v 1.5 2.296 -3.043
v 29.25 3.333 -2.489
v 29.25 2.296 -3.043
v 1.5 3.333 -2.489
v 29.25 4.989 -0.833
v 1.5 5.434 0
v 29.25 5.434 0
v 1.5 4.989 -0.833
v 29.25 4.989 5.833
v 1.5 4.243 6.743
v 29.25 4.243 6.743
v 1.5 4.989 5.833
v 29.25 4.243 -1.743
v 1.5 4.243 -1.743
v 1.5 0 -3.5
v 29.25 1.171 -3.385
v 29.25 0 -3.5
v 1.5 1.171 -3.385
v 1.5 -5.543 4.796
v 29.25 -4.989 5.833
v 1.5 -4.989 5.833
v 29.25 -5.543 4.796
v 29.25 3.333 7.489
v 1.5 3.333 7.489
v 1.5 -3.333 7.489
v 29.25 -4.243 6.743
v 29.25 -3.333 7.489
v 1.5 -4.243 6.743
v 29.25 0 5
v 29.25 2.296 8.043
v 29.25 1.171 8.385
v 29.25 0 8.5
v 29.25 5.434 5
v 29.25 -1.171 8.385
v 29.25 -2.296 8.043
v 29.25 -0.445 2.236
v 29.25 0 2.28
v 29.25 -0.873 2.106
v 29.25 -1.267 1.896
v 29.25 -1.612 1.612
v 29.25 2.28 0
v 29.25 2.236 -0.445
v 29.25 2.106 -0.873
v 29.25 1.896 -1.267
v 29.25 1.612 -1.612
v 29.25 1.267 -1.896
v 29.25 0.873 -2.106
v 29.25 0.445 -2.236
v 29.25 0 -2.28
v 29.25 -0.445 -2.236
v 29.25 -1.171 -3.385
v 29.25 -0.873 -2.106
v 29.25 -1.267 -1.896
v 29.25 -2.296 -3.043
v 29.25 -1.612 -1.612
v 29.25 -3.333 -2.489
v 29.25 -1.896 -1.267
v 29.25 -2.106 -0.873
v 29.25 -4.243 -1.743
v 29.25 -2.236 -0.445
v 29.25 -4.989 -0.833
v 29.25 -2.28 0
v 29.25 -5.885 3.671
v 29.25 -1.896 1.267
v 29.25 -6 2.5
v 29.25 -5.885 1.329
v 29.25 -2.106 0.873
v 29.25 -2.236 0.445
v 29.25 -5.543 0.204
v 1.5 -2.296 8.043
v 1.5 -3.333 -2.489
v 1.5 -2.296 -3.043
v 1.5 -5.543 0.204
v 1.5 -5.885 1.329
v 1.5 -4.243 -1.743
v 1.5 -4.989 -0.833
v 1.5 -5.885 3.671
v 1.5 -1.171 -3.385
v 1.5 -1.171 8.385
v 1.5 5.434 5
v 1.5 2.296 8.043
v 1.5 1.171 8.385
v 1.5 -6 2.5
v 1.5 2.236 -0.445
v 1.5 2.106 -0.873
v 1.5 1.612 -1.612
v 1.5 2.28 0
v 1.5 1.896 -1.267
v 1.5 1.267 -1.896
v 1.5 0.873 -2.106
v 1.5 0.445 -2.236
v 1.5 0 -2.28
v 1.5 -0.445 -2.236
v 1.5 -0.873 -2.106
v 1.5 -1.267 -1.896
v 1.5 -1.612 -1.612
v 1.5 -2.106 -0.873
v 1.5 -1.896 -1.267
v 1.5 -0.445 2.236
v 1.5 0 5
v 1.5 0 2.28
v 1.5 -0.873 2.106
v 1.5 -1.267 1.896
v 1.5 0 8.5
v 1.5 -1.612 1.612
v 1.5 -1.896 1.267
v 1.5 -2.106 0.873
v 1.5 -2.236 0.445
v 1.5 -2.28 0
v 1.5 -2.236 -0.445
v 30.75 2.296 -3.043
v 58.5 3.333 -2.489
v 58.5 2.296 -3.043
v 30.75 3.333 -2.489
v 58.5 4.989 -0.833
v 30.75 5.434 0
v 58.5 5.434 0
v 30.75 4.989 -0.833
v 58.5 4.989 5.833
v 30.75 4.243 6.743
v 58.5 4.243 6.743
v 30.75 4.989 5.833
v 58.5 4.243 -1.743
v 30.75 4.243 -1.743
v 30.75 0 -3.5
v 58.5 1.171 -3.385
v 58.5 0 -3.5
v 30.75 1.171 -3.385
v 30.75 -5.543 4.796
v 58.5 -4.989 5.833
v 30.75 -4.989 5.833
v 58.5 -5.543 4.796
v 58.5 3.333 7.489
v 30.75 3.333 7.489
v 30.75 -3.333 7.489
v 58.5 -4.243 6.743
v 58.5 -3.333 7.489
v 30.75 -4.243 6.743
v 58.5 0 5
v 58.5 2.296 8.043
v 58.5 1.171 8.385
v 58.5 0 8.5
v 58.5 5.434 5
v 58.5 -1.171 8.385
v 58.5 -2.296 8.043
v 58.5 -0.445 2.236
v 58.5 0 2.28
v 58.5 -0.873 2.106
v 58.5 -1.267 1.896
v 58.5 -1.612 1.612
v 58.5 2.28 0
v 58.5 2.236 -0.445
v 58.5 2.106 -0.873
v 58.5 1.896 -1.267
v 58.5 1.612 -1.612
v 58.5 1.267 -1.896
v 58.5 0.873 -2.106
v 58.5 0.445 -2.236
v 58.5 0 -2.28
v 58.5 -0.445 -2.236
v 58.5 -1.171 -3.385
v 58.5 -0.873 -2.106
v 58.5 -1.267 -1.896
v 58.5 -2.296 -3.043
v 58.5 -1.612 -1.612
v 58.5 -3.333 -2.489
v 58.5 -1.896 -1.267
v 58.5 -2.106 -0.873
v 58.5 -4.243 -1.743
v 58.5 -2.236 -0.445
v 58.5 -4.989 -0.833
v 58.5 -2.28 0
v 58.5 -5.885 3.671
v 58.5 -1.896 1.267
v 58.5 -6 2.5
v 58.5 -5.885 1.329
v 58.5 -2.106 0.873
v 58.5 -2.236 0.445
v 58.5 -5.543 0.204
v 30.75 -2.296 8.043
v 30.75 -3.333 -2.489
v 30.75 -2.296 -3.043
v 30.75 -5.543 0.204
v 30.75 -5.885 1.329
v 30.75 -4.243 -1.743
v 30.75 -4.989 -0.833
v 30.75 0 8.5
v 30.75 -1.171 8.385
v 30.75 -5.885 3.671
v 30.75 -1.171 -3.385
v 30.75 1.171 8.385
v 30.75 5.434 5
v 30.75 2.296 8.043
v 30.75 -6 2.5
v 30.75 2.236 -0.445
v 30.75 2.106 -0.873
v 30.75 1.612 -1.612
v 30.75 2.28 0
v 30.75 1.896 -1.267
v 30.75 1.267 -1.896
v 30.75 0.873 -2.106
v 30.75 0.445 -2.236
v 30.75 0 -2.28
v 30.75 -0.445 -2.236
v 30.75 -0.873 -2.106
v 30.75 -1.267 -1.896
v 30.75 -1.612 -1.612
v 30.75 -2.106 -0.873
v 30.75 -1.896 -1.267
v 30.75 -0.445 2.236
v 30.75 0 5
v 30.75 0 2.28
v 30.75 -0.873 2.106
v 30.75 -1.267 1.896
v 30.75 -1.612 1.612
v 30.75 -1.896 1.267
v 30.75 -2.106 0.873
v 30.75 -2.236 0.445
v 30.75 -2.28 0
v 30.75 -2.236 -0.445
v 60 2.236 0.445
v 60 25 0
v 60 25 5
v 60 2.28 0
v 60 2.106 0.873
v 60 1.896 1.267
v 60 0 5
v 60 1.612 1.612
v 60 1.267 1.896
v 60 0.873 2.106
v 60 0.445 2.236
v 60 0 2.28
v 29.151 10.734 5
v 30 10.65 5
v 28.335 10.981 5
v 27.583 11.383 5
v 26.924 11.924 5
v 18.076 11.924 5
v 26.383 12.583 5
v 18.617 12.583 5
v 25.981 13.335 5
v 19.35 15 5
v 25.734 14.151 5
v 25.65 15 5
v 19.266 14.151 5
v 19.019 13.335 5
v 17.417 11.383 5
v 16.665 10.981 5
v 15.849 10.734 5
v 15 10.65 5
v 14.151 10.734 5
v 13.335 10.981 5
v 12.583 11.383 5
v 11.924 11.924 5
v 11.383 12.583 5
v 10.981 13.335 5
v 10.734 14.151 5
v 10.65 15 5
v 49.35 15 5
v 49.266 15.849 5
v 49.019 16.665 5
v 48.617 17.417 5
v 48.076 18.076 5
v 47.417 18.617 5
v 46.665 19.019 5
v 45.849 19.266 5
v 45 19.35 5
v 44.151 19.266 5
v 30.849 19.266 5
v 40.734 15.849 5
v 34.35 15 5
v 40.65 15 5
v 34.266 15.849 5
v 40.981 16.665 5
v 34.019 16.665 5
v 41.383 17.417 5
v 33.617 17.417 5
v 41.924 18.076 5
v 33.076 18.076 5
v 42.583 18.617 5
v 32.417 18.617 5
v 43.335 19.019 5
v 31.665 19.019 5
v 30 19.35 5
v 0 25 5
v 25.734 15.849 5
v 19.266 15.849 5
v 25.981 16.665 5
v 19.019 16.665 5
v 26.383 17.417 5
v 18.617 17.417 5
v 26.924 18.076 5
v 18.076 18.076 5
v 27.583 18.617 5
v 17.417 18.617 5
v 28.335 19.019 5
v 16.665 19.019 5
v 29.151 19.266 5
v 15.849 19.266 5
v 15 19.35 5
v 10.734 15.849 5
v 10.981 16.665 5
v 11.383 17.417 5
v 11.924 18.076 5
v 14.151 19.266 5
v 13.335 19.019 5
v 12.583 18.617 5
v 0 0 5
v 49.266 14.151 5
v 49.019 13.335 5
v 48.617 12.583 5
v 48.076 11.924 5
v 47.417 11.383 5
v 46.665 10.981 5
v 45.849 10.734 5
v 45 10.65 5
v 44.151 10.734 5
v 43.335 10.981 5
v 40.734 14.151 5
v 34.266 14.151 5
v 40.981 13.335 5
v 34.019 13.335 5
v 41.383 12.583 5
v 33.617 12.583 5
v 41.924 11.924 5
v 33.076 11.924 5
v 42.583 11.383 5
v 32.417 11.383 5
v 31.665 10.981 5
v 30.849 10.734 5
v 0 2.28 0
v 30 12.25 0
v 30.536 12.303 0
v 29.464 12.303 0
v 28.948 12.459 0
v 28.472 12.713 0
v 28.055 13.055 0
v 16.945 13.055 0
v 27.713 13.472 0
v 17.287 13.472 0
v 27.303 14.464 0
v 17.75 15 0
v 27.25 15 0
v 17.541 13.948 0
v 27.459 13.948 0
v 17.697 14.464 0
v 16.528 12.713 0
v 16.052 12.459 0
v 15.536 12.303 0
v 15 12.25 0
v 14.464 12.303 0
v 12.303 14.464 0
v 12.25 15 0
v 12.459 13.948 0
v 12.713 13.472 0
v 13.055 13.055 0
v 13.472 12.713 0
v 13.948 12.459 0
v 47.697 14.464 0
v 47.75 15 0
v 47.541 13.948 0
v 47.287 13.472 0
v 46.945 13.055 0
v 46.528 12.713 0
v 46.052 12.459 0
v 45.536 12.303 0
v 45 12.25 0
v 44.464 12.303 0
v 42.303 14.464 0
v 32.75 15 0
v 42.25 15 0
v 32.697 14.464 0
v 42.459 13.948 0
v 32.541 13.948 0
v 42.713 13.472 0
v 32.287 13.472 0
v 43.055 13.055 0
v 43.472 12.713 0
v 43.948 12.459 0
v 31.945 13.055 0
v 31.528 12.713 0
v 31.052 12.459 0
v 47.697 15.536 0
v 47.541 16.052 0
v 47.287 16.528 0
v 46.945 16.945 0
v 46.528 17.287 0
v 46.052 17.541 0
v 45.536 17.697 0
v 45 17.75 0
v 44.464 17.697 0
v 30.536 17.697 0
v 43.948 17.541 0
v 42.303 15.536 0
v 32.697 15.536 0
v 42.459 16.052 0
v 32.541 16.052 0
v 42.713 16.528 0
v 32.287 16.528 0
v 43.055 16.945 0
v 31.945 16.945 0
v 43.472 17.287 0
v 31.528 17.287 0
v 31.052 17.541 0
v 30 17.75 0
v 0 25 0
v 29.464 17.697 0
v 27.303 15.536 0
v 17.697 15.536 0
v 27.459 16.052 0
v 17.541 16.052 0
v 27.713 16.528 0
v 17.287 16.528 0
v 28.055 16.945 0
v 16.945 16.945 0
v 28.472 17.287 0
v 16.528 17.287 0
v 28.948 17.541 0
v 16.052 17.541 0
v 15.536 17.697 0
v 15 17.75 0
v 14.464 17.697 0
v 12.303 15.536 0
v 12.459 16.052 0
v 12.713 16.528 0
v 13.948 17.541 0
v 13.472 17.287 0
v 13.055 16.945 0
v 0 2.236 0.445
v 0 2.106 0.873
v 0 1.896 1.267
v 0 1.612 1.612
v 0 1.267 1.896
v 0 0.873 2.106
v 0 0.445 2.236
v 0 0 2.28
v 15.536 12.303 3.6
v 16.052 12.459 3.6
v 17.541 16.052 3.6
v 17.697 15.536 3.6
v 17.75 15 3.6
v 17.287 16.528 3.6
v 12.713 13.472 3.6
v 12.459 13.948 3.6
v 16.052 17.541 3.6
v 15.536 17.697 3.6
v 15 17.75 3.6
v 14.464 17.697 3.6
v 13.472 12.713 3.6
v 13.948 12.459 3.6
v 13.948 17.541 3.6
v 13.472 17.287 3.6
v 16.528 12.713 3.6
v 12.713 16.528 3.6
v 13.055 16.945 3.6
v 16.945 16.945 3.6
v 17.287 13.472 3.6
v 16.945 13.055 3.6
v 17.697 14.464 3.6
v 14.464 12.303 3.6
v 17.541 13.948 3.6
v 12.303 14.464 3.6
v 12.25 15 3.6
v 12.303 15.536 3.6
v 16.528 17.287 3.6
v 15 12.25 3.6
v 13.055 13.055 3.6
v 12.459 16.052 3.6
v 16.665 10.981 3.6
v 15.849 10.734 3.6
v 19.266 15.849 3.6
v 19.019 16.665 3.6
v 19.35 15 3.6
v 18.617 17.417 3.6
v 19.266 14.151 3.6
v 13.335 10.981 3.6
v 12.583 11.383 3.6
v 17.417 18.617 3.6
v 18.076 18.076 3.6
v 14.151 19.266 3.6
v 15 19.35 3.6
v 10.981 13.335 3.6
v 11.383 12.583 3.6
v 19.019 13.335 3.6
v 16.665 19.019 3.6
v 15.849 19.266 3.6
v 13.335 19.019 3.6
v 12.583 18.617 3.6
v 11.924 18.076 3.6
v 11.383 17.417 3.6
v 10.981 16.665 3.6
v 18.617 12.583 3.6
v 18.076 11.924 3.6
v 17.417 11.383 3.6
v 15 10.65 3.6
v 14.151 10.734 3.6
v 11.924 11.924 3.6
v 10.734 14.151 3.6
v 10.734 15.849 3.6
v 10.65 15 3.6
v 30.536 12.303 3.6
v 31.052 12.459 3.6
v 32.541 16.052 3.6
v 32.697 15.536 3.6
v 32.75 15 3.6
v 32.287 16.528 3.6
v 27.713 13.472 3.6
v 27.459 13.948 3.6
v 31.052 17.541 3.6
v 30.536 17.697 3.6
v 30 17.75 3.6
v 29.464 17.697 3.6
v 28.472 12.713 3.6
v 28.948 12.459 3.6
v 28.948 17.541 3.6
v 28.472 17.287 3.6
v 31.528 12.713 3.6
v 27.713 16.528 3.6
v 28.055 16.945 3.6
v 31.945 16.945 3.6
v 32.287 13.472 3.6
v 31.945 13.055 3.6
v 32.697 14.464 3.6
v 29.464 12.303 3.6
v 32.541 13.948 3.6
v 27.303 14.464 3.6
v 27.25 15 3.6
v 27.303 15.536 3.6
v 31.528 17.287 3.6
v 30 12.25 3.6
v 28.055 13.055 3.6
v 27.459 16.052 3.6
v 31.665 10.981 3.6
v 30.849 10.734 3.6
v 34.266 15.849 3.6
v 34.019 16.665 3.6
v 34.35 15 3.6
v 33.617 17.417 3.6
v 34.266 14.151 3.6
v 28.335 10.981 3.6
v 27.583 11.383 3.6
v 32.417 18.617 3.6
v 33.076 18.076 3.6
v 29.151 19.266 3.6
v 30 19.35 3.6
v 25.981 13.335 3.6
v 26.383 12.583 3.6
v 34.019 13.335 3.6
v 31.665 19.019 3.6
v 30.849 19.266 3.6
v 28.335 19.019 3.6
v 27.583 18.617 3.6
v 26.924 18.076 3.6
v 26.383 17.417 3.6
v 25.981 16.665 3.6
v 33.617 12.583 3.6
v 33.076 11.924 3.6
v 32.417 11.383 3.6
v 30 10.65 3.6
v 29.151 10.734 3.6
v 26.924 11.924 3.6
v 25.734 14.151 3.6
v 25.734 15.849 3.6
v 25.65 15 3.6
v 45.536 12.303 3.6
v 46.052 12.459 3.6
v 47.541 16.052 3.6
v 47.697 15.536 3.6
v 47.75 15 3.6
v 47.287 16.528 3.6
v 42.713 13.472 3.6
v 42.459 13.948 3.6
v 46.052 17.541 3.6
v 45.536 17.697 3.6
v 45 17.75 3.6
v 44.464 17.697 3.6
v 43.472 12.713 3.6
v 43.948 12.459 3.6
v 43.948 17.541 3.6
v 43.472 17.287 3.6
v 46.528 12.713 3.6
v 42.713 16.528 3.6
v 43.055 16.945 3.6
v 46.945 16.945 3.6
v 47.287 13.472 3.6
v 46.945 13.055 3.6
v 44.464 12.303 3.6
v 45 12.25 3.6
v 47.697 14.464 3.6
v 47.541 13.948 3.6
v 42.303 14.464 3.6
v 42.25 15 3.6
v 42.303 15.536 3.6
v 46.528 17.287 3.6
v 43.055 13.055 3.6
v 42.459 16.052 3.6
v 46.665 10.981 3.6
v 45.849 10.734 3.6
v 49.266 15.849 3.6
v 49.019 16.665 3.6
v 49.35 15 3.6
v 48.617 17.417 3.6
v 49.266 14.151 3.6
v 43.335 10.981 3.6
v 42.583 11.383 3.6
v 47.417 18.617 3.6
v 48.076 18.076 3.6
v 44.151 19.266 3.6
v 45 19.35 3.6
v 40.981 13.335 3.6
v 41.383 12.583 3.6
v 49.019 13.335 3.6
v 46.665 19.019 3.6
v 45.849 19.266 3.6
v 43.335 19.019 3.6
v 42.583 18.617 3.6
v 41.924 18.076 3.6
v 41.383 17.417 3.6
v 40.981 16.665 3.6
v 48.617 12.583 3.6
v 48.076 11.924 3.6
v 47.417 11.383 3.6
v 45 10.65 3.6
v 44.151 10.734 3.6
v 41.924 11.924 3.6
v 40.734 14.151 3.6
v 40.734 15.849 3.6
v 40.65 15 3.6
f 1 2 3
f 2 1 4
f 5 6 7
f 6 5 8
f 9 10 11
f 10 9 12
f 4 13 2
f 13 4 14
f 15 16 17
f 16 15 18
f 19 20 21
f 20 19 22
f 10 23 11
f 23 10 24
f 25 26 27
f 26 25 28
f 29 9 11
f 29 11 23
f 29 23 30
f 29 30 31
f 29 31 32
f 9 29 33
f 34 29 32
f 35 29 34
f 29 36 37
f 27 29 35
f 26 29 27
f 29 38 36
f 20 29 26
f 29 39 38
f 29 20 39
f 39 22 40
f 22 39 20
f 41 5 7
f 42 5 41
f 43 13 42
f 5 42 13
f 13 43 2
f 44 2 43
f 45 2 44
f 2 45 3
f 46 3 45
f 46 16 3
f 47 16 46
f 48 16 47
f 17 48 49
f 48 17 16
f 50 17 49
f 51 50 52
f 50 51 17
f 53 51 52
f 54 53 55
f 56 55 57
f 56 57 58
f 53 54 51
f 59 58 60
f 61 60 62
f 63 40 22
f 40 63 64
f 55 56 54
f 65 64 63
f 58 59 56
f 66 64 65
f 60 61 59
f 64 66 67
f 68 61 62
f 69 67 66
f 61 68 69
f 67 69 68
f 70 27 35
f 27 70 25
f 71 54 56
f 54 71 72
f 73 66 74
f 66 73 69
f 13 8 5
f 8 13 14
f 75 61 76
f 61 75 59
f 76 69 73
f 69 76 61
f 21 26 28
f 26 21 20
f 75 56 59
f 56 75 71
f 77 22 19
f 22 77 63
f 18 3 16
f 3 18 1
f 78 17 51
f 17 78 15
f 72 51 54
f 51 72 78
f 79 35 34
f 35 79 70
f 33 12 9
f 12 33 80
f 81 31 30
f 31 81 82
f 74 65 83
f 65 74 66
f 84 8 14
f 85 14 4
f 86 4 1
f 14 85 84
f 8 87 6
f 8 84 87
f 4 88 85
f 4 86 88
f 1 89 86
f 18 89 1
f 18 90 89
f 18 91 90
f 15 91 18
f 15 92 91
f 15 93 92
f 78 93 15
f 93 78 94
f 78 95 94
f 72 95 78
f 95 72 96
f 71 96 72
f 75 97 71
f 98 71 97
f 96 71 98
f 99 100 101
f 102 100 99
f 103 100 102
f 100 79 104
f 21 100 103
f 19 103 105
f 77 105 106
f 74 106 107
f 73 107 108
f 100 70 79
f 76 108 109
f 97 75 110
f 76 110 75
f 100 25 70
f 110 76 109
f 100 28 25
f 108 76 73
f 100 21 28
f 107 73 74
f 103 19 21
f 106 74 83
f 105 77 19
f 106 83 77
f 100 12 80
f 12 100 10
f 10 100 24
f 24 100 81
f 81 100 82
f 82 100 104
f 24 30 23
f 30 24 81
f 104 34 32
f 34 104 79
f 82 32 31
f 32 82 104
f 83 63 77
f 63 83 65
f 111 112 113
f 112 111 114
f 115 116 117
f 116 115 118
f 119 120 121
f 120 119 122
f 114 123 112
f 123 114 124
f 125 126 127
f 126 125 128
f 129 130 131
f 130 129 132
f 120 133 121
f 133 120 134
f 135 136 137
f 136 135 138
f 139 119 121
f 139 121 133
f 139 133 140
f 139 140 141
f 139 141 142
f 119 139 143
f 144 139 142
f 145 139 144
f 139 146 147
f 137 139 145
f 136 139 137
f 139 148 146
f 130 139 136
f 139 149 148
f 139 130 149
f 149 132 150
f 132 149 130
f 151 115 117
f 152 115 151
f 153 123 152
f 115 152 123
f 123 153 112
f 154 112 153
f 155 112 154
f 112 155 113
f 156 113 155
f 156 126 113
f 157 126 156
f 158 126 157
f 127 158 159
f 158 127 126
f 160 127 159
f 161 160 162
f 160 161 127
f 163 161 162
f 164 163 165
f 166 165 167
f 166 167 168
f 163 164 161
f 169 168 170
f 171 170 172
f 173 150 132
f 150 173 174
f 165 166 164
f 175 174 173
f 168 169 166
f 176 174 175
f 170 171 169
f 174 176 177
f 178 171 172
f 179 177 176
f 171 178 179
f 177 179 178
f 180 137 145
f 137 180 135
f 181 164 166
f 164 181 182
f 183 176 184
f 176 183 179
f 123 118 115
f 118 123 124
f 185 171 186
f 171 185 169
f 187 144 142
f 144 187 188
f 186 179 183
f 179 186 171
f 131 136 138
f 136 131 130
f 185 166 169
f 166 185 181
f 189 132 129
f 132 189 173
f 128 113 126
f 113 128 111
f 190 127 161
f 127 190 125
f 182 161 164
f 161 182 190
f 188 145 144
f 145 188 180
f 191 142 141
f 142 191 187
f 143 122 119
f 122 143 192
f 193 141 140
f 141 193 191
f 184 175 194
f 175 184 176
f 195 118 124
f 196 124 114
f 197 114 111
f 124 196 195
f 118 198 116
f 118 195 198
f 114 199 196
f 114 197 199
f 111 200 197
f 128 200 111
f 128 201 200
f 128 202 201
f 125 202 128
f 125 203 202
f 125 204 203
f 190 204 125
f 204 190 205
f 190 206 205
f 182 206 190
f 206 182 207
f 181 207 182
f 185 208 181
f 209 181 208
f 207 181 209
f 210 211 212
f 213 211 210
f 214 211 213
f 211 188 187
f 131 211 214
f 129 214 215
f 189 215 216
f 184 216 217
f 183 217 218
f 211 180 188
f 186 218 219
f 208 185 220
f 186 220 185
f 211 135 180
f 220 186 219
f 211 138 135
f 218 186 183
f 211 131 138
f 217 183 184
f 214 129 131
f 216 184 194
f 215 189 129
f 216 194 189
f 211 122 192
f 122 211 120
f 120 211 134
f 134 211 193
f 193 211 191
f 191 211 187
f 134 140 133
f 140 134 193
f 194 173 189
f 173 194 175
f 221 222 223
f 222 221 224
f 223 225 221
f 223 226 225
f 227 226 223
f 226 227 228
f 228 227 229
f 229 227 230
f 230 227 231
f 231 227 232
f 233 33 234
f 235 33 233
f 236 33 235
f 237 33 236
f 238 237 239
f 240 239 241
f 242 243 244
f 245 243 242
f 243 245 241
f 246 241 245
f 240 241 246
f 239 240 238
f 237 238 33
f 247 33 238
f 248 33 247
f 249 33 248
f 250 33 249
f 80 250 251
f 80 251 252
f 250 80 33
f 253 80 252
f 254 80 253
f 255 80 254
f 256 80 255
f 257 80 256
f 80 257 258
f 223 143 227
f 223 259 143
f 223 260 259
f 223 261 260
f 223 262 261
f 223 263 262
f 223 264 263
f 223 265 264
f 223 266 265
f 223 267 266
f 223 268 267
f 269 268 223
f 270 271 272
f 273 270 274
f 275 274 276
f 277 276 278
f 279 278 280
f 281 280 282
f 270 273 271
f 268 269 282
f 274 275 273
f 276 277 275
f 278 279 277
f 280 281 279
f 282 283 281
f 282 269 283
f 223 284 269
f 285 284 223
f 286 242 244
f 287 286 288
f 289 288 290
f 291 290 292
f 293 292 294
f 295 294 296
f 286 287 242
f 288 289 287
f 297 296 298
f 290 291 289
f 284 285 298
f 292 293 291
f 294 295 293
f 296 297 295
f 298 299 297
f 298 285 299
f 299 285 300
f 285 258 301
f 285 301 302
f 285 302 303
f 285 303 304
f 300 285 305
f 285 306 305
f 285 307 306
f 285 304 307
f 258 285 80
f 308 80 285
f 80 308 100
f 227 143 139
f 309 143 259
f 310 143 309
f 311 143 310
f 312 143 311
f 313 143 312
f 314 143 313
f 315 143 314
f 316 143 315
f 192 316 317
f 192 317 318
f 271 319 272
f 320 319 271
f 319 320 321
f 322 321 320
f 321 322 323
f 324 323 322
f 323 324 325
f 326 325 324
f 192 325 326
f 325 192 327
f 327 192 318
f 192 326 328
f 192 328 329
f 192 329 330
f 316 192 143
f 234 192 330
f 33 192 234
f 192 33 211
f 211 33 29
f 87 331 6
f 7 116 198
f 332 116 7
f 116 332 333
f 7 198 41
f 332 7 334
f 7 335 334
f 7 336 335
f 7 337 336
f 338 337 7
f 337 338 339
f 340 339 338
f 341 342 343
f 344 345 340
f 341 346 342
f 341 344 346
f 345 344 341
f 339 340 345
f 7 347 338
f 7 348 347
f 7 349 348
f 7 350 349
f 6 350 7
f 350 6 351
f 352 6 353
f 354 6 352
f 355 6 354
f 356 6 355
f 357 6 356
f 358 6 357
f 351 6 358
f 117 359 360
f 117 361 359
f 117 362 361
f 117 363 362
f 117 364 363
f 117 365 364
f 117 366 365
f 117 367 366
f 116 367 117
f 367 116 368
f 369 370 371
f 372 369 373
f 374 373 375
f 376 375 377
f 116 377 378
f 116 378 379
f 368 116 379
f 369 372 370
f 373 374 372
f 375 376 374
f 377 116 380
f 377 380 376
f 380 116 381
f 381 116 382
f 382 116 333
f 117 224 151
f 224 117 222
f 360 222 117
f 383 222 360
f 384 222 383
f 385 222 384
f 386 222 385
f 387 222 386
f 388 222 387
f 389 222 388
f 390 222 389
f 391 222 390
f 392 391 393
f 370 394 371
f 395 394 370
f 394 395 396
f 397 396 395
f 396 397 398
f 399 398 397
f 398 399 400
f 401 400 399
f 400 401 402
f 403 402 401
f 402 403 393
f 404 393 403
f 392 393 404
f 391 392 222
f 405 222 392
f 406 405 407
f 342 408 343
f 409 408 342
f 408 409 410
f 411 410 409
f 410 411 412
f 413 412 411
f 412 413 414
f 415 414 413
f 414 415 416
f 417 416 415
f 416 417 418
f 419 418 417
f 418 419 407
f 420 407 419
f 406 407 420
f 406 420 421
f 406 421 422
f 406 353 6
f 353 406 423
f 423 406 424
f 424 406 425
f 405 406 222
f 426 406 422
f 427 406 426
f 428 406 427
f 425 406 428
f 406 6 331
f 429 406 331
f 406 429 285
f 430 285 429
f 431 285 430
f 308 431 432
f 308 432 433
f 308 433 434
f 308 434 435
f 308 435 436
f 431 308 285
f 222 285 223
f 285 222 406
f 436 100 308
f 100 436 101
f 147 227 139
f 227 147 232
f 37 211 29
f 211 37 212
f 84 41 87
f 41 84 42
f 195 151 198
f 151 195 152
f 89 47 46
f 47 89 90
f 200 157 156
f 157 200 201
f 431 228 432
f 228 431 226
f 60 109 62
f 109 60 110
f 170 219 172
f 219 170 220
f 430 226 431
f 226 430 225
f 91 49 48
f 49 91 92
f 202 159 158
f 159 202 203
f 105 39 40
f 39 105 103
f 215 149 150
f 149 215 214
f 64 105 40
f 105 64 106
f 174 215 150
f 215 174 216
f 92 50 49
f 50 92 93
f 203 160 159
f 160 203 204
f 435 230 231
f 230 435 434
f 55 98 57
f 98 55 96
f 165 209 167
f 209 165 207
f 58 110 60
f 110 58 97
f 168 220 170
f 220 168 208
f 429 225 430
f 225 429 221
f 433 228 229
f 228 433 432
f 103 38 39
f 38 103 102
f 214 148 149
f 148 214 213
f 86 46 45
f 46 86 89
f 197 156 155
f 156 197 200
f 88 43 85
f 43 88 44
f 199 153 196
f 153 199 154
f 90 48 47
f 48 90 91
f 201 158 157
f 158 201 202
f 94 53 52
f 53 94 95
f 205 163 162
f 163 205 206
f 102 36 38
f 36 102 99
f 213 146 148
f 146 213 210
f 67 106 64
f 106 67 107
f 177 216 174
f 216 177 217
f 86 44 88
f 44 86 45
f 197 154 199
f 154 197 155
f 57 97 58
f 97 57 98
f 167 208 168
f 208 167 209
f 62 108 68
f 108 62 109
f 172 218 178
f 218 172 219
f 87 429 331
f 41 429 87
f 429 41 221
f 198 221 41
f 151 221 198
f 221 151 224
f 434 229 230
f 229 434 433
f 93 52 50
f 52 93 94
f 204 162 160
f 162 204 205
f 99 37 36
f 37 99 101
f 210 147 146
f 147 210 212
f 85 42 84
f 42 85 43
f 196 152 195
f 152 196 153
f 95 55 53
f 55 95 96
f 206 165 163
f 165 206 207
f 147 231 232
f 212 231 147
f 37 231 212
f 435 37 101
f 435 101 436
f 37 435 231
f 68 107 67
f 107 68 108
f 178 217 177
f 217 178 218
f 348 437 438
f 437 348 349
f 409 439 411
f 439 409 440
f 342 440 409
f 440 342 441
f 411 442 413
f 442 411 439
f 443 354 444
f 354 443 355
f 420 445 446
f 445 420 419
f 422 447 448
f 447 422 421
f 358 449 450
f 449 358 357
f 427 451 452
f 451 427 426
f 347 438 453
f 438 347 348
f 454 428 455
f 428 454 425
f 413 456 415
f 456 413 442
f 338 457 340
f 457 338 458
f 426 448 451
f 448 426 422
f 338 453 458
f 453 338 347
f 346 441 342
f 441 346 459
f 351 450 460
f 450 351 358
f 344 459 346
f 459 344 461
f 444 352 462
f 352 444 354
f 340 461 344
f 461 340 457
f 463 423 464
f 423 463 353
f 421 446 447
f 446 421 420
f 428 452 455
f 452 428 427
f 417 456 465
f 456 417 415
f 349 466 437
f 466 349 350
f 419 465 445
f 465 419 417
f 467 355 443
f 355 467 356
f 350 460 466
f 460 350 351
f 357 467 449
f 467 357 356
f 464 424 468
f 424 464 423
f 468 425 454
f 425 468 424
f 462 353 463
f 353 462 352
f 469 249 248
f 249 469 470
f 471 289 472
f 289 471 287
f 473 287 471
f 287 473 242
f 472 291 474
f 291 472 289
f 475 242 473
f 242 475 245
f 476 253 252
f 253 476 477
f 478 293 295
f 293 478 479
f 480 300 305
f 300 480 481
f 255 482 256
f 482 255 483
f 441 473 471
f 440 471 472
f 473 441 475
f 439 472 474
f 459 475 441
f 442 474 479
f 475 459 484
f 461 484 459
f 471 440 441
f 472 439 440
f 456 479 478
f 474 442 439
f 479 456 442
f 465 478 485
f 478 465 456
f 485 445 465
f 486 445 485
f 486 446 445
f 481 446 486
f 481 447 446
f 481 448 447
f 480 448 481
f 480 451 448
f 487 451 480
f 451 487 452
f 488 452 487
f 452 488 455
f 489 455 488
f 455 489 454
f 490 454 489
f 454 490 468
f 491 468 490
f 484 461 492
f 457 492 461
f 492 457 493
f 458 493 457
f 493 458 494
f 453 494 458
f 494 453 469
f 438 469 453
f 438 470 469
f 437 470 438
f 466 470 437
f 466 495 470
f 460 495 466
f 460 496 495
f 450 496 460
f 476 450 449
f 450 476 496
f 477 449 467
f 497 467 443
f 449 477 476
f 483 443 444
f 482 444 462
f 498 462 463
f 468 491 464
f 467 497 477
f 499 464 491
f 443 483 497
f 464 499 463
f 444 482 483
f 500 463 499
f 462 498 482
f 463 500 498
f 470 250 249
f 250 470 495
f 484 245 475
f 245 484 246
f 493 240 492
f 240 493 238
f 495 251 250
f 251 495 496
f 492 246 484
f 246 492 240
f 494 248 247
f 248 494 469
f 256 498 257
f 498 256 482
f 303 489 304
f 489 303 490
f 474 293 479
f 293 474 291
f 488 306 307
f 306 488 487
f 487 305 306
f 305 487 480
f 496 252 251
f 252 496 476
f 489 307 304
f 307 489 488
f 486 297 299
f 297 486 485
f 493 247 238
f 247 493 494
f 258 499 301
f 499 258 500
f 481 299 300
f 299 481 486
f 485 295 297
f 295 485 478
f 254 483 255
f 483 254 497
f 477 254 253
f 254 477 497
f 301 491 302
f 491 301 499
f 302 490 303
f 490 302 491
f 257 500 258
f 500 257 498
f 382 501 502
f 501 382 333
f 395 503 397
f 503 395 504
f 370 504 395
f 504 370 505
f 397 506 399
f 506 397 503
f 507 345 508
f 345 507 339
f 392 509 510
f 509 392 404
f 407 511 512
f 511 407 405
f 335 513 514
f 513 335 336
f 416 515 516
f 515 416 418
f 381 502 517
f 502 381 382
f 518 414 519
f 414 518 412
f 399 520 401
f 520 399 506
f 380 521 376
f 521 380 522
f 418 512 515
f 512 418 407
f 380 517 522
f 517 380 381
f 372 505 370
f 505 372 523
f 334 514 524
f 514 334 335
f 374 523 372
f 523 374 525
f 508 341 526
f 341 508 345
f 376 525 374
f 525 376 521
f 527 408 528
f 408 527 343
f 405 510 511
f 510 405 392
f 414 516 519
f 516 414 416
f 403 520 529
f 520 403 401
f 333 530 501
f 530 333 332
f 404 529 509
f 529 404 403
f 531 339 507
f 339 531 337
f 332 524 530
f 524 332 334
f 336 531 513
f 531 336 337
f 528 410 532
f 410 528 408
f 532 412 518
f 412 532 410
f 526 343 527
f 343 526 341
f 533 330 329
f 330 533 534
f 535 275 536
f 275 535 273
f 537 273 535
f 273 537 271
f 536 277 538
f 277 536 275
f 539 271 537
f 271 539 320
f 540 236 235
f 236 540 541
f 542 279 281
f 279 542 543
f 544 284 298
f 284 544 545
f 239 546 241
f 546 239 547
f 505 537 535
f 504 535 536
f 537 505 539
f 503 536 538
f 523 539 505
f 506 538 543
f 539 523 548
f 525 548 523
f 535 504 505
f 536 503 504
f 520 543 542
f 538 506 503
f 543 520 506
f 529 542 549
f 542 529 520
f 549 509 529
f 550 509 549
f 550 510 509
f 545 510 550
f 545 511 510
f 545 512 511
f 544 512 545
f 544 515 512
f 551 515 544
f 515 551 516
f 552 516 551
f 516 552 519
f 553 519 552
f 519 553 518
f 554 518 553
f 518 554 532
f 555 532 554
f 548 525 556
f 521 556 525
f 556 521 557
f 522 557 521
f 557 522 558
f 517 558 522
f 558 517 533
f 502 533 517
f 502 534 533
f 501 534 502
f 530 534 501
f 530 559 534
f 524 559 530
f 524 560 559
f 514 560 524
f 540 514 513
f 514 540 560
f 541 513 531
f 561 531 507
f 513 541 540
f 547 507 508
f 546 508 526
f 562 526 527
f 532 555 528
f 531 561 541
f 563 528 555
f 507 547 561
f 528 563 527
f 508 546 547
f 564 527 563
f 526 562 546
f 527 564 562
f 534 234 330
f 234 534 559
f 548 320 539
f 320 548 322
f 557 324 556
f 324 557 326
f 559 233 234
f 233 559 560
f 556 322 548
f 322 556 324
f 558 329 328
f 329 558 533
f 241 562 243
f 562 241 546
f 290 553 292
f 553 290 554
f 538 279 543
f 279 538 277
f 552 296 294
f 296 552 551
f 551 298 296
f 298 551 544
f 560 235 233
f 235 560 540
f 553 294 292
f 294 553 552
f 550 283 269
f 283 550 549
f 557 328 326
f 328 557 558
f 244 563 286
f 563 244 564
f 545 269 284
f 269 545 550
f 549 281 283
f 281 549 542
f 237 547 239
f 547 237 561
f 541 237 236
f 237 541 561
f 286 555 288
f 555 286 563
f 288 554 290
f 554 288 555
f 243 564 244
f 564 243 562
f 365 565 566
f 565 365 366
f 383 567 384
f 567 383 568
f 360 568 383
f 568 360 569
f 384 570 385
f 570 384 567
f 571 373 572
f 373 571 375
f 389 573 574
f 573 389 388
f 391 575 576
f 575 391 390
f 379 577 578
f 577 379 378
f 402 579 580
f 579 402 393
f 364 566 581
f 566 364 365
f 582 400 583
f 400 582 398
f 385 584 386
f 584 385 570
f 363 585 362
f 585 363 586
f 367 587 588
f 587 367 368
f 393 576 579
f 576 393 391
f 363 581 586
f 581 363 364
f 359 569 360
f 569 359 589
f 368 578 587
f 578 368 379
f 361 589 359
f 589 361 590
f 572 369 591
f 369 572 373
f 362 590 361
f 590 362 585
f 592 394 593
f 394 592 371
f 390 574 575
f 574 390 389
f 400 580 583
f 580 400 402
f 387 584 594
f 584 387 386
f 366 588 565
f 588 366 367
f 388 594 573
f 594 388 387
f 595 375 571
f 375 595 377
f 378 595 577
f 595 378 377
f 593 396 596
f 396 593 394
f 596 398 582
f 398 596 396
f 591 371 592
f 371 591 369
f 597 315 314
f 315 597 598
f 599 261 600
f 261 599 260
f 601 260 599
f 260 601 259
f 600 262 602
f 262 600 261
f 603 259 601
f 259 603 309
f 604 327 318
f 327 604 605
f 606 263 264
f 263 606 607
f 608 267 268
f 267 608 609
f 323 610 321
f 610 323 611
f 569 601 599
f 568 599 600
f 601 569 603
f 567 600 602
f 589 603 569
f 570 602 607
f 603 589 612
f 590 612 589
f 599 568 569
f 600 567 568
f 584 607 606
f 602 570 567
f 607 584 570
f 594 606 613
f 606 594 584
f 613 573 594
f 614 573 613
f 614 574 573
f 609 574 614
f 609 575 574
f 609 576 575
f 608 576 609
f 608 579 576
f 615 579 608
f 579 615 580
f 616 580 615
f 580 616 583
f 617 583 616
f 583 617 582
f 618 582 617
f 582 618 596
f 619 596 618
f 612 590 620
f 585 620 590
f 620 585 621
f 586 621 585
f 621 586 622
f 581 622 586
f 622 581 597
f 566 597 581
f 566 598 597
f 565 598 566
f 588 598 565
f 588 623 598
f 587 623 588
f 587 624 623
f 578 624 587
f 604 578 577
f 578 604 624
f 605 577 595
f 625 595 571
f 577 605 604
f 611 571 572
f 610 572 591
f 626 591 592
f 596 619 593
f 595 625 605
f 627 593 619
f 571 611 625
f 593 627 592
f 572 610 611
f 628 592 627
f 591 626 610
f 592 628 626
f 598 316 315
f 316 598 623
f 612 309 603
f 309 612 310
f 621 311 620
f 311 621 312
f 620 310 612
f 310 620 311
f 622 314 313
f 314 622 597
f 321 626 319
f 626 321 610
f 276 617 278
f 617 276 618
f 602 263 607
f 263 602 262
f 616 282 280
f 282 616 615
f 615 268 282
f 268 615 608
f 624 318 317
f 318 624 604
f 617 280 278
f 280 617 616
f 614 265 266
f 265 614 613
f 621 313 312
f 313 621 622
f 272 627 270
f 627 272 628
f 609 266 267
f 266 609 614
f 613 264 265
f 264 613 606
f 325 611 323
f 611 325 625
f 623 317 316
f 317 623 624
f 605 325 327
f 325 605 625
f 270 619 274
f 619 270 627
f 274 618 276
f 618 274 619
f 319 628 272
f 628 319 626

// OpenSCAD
$fn = 32;

// ----------------------------------------------------------------------
// Hinge leaf: 60 x 31 x 12 mm
// ----------------------------------------------------------------------

// --- parameters (mm) ---
plate_len = 60;           // leaf length, X
plate_w = 25;             // leaf width, Y
plate_t = 5;              // leaf thickness
barrel_d = 12;            // knuckle diameter
barrel_w = 27.75;         // knuckle width
knuckle_n = 2;            // number of knuckles
pin_d = 4.56;             // pin bore
gap = 1.5;                // gap between the knuckles
screw_d = 5.5;            // screw clearance
cs_d = 8.7;               // countersink diameter
cs_h = 1.4;               // countersink depth

module leaf() {
  cube([plate_len, plate_w, plate_t]);
}

module knuckles() {
  /* barrels sit on the leaf edge, the pin axis at half the leaf thickness */
  for (i = [0 : knuckle_n - 1])
    translate([gap + i * (barrel_w + gap), 0, plate_t * 0.5])
      rotate([0, 90, 0]) cylinder(h = barrel_w, d = barrel_d);
}

difference() {
  union() {
    leaf();
    knuckles();
  }
  rotate([0, 90, 0]) translate([0, 0, -1])
    cylinder(h = plate_len + 2, d = pin_d);
  translate([15, plate_w * 0.6, -1]) cylinder(h = plate_t + 2, d = screw_d);
  translate([15, plate_w * 0.6, plate_t - cs_h]) cylinder(h = cs_h + 0.5, d = cs_d);
  translate([30, plate_w * 0.6, -1]) cylinder(h = plate_t + 2, d = screw_d);
  translate([30, plate_w * 0.6, plate_t - cs_h]) cylinder(h = cs_h + 0.5, d = cs_d);
  translate([45, plate_w * 0.6, -1]) cylinder(h = plate_t + 2, d = screw_d);
  translate([45, plate_w * 0.6, plate_t - cs_h]) cylinder(h = cs_h + 0.5, d = cs_d);
}
